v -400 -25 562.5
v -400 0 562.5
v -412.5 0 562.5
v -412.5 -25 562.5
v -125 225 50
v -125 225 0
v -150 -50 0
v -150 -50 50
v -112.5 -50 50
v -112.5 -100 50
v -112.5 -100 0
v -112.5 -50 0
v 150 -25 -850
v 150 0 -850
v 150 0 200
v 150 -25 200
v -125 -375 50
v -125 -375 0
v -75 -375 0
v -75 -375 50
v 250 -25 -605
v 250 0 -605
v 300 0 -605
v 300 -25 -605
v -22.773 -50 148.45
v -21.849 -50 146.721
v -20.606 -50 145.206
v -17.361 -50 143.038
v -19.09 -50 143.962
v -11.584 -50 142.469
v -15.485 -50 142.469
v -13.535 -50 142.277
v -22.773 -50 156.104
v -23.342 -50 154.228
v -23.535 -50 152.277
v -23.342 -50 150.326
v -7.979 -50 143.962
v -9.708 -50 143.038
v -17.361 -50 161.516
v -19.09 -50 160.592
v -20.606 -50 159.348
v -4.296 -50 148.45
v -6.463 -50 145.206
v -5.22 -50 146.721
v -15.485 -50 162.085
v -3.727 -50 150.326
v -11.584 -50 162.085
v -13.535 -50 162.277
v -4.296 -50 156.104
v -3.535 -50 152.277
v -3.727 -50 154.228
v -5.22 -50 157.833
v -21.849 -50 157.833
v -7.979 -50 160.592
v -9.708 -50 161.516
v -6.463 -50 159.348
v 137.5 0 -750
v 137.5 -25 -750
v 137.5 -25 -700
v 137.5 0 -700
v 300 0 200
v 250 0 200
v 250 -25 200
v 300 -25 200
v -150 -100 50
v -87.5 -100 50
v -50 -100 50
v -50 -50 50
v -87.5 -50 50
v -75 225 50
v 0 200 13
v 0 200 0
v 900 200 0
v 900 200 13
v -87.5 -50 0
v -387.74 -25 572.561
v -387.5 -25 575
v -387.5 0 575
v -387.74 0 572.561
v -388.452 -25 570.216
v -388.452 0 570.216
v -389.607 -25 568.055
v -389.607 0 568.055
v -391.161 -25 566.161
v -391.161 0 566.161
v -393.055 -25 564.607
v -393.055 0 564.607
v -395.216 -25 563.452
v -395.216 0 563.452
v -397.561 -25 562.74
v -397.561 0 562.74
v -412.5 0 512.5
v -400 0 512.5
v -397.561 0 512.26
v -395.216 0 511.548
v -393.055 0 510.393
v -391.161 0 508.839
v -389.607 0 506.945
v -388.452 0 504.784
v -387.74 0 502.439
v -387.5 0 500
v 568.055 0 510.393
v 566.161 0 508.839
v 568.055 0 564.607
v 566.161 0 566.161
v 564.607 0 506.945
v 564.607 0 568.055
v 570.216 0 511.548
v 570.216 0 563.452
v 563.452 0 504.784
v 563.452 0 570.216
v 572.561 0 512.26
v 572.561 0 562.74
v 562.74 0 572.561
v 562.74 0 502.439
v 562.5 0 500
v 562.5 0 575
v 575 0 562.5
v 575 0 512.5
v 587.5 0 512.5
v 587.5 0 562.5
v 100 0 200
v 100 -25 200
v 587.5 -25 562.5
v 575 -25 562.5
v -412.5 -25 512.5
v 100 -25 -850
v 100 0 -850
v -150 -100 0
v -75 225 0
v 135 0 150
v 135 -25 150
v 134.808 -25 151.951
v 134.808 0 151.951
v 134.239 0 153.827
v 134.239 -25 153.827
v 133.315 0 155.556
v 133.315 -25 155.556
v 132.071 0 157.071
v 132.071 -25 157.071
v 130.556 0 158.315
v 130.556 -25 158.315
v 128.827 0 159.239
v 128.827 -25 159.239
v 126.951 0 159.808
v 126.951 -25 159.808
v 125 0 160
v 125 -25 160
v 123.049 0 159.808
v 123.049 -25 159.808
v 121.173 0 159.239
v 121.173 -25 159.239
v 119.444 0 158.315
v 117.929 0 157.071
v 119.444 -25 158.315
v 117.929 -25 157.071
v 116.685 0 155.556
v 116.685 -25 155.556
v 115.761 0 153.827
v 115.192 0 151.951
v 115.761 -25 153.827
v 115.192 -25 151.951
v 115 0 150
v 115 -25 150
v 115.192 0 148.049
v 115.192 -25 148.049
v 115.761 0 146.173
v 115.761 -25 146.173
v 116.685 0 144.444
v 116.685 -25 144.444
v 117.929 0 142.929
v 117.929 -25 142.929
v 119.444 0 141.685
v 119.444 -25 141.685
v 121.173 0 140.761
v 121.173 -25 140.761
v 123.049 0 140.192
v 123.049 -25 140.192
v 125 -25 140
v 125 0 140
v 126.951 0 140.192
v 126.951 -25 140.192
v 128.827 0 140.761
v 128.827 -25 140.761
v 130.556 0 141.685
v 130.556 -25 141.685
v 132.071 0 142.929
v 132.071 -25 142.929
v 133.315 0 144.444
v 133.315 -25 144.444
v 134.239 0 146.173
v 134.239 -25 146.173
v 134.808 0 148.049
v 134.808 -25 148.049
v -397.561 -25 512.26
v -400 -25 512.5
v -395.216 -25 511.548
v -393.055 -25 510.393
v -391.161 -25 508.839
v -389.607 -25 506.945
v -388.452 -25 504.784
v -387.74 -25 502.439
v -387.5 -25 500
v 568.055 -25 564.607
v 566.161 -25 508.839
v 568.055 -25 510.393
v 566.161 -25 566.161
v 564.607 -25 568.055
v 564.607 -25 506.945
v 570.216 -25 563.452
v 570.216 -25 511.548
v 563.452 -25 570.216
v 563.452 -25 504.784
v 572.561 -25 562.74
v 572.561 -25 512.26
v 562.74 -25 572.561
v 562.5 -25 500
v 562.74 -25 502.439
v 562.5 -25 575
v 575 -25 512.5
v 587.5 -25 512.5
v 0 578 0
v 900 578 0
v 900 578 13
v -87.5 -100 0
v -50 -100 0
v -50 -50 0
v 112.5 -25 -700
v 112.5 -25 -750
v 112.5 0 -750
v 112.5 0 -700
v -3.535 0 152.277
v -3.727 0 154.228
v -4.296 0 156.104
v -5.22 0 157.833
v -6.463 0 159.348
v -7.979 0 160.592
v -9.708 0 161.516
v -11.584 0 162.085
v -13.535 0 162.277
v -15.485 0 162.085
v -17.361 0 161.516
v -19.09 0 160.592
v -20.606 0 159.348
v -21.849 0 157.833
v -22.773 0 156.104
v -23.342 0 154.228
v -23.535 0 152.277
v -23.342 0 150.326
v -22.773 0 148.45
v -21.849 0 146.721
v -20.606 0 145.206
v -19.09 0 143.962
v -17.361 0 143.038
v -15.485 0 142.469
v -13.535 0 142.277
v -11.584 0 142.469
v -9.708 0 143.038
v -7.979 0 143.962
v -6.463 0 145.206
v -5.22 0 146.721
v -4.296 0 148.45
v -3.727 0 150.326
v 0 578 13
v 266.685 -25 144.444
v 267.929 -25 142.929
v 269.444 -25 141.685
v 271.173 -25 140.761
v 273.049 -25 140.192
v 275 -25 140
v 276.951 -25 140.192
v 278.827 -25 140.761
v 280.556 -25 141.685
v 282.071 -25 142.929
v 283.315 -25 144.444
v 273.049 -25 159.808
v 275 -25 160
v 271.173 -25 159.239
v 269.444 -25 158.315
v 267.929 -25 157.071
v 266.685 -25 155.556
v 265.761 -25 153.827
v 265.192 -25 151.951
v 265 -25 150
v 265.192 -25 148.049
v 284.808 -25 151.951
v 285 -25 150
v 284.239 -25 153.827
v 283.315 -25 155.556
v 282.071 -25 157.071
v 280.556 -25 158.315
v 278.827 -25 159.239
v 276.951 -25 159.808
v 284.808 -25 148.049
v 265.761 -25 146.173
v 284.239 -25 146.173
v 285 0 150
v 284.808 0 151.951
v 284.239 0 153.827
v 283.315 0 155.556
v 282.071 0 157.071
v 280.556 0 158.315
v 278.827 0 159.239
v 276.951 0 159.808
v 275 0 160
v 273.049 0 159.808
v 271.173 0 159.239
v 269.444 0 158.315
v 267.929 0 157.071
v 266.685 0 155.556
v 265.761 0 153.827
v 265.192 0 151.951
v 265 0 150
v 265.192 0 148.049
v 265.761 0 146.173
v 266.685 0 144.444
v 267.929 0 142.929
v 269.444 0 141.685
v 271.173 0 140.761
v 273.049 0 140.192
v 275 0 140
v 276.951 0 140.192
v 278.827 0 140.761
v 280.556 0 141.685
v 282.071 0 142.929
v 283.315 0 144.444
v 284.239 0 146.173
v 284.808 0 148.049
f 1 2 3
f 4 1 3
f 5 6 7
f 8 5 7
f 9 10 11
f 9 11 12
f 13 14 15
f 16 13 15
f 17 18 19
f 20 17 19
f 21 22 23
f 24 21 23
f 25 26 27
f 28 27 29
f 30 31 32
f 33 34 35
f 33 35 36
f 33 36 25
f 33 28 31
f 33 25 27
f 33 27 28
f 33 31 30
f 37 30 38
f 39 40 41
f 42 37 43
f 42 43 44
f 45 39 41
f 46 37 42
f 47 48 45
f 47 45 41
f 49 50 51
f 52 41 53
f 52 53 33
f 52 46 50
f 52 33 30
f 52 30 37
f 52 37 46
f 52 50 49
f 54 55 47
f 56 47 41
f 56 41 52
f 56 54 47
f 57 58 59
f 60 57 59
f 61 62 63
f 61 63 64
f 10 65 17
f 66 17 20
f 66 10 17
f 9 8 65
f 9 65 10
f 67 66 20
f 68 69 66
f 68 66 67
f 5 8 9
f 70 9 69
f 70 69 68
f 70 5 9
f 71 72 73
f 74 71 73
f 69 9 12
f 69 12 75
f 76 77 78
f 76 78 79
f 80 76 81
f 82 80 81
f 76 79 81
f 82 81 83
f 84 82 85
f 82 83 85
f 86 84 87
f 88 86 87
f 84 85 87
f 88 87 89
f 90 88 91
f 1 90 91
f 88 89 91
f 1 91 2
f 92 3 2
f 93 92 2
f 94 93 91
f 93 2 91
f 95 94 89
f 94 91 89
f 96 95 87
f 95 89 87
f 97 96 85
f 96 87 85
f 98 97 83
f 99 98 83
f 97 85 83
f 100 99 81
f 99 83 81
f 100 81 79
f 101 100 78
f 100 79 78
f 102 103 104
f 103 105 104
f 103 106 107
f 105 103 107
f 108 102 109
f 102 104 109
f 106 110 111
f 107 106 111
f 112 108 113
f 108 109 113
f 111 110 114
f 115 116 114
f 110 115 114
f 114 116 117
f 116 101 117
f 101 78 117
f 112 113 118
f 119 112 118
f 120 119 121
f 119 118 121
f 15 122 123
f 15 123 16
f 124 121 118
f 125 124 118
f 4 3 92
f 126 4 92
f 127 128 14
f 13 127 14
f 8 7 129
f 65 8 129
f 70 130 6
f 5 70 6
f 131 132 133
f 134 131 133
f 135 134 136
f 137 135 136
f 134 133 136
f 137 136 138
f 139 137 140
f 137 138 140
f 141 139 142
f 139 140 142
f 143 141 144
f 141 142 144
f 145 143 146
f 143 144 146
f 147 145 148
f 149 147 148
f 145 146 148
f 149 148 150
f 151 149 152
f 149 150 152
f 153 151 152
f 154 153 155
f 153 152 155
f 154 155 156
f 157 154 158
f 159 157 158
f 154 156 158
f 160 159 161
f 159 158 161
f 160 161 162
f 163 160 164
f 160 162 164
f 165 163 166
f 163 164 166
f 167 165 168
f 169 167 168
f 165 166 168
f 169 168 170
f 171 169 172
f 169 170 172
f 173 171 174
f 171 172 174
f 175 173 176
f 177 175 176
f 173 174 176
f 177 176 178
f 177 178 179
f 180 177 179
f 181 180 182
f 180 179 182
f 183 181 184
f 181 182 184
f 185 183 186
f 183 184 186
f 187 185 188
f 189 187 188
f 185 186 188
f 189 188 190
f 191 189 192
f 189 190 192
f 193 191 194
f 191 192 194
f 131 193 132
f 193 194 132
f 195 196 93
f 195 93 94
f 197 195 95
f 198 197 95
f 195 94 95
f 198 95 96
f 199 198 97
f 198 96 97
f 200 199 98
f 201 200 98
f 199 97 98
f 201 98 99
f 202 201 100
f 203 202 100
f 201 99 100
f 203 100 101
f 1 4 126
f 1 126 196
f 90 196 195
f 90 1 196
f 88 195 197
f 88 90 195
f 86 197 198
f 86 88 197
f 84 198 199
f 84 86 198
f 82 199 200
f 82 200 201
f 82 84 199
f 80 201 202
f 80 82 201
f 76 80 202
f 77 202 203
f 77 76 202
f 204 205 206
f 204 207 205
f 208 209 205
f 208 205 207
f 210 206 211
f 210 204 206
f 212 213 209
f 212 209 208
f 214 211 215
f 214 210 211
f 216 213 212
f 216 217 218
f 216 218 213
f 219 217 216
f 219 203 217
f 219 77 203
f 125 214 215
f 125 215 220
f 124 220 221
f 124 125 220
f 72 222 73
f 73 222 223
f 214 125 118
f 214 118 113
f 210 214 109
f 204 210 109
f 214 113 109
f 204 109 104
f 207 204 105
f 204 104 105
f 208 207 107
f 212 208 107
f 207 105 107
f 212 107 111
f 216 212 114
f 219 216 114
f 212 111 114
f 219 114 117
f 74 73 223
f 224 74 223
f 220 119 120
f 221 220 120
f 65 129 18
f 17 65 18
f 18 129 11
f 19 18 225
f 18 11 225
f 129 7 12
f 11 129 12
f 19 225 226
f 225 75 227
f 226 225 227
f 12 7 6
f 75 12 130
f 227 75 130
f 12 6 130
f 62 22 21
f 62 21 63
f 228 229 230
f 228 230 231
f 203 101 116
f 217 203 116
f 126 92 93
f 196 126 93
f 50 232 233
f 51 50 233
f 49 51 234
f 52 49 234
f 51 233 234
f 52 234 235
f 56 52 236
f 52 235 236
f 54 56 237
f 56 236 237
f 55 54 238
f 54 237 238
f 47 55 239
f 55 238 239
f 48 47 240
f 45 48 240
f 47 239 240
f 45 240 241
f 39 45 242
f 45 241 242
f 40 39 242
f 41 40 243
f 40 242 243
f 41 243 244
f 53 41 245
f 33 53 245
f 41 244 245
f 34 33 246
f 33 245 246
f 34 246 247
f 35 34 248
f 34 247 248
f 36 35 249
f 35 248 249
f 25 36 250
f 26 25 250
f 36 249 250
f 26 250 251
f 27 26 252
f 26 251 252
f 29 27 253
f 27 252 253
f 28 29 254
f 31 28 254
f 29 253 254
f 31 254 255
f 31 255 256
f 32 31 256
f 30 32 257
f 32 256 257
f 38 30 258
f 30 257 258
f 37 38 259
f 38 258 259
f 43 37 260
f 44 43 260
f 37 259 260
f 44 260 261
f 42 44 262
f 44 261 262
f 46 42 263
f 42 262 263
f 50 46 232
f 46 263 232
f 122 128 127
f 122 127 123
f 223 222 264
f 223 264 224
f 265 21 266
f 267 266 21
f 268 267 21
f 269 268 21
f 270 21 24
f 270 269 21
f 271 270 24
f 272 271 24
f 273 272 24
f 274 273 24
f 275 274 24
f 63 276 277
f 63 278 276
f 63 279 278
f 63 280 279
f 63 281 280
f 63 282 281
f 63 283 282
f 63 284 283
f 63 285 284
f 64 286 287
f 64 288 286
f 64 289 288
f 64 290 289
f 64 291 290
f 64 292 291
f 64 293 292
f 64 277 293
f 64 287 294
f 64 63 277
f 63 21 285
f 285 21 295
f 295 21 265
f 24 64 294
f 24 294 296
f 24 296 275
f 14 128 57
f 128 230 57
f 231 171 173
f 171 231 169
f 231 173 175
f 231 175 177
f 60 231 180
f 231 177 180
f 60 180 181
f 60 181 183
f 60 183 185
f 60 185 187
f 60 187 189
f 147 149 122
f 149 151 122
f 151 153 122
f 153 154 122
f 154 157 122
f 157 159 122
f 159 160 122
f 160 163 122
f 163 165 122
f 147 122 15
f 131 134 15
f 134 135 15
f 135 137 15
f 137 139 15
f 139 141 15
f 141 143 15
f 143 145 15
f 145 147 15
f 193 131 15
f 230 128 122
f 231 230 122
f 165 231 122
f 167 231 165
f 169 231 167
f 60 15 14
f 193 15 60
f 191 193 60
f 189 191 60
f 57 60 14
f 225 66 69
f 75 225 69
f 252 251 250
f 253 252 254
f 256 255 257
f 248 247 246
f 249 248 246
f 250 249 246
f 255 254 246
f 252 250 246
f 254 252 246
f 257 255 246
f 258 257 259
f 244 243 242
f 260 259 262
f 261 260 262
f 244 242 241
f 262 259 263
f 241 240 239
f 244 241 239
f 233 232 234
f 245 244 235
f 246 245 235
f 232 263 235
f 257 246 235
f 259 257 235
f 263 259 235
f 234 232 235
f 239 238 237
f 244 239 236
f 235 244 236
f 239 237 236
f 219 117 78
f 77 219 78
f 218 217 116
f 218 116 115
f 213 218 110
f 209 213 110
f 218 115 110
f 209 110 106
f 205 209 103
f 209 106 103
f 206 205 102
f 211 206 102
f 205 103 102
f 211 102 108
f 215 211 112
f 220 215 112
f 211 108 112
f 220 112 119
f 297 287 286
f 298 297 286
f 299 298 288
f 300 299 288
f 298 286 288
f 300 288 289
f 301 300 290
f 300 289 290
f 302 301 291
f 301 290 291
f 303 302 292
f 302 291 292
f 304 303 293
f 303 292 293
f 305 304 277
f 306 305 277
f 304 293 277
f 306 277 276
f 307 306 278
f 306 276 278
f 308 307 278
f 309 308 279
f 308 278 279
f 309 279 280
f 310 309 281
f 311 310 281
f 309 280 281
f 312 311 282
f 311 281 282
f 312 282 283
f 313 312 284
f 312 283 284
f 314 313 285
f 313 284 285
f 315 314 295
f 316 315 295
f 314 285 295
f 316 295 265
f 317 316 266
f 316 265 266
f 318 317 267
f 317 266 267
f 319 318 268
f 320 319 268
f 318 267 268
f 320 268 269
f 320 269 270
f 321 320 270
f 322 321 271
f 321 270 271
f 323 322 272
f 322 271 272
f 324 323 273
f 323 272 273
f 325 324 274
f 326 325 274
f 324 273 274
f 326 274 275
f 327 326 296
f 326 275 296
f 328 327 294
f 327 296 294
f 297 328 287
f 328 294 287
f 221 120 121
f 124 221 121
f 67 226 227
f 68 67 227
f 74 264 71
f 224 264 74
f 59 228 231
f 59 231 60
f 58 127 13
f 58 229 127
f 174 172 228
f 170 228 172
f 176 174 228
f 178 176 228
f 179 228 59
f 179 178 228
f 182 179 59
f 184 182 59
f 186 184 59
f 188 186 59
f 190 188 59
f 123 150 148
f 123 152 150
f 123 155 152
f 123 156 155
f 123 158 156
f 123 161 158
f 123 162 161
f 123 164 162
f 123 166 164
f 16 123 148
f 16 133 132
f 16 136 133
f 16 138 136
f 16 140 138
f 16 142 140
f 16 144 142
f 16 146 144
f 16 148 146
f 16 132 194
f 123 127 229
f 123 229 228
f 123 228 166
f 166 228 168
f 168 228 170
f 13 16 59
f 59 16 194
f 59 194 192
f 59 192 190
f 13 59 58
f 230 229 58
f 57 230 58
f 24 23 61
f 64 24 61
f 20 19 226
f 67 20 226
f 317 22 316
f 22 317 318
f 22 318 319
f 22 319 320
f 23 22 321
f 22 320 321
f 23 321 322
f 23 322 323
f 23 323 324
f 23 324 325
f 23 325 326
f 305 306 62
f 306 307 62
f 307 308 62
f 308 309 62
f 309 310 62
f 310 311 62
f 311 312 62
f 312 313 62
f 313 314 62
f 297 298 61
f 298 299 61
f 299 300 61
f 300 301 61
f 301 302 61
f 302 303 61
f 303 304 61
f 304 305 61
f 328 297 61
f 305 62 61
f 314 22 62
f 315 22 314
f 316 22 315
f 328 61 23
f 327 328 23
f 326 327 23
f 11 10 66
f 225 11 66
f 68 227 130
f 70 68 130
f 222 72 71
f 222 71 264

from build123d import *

# Parameters (mm, degrees)
F1_DEPTH  = 50
F2_W      = 25
F2_H      = 50
F3_DEPTH  = 50
F4_W      = 50
F4_H      = 1050
F5_DEPTH  = 25
F6_W      = 25
F6_H      = 50
F6_R      = 10
F7_DEPTH  = 25
F8_W      = 50
F8_H      = 805
F9_DEPTH  = 25
F10_R     = 10
F11_DEPTH = 25
F13_DEPTH = 25
F14_R     = 10
F15_DEPTH = 50
F16_W     = 900
F16_H     = 378
F17_DEPTH = 13


with BuildPart() as f1:
    # F0 (on Top) → F1 (new body)
    with BuildSketch(Plane.XY):
        Polygon((-75, 225), (-125, 225), (-150, -50), (-150, -100), (-125, -375), (-75, -375), (-50, -100), (-50, -50), align=None)
    extrude(amount=F1_DEPTH)

    # F2 (on face) → F3 (cut, through all)
    with BuildSketch(Plane.XY.offset(50)):
        with Locations((-100, -75)):
            Rectangle(F2_W, F2_H)
    extrude(amount=-F3_DEPTH, mode=Mode.SUBTRACT)


with BuildPart() as f5:
    # F4 (on Front) → F5 (new body)
    with BuildSketch(Plane.XZ):
        with Locations((125, -325)):
            Rectangle(F4_W, F4_H)
    extrude(amount=F5_DEPTH)

    # F6 (on face) → F7 (cut, through all)
    with BuildSketch(Plane.XZ.offset(25)):
        with Locations((125, -725)):
            Rectangle(F6_W, F6_H)
        with Locations((125, 150)):
            Circle(F6_R)
    extrude(amount=-F7_DEPTH, mode=Mode.SUBTRACT)


with BuildPart() as f9:
    # F8 (on Front) → F9 (new body)
    with BuildSketch(Plane.XZ):
        with Locations((275, -202.5)):
            Rectangle(F8_W, F8_H)
    extrude(amount=F9_DEPTH)

    # F10 (on face) → F11 (cut, through all)
    with BuildSketch(Plane.XZ.offset(25)):
        with Locations((275, 150)):
            Circle(F10_R)
    extrude(amount=-F11_DEPTH, mode=Mode.SUBTRACT)


with BuildPart() as f13:
    # F12 (on Front) → F13 (new body)
    with BuildSketch(Plane.XZ):
        with BuildLine():
            Line((-400, 562.5), (-412.5, 562.5))
            Line((-412.5, 562.5), (-412.5, 512.5))
            Line((-412.5, 512.5), (-400, 512.5))
            ThreePointArc((-400, 512.5), (-391.161165, 508.838835), (-387.5, 500))
            Line((-387.5, 500), (562.5, 500))
            ThreePointArc((562.5, 500), (566.161165, 508.838835), (575, 512.5))
            Line((575, 512.5), (587.5, 512.5))
            Line((587.5, 512.5), (587.5, 562.5))
            Line((587.5, 562.5), (575, 562.5))
            ThreePointArc((575, 562.5), (566.161165, 566.161165), (562.5, 575))
            Line((562.5, 575), (-387.5, 575))
            ThreePointArc((-387.5, 575), (-391.161165, 566.161165), (-400, 562.5))
        make_face()
    extrude(amount=F13_DEPTH)


with BuildPart() as f15:
    # F14 (on Front) → F15 (new body)
    with BuildSketch(Plane.XZ):
        with Locations((-13.534553, 152.277187)):
            Circle(F14_R)
    extrude(amount=F15_DEPTH)


with BuildPart() as f17:
    # F16 (on Top) → F17 (new body)
    with BuildSketch(Plane.XY):
        with Locations((450, 389)):
            Rectangle(F16_W, F16_H)
    extrude(amount=F17_DEPTH)


solid = Compound([f1.part, f5.part, f9.part, f13.part, f15.part, f17.part])
